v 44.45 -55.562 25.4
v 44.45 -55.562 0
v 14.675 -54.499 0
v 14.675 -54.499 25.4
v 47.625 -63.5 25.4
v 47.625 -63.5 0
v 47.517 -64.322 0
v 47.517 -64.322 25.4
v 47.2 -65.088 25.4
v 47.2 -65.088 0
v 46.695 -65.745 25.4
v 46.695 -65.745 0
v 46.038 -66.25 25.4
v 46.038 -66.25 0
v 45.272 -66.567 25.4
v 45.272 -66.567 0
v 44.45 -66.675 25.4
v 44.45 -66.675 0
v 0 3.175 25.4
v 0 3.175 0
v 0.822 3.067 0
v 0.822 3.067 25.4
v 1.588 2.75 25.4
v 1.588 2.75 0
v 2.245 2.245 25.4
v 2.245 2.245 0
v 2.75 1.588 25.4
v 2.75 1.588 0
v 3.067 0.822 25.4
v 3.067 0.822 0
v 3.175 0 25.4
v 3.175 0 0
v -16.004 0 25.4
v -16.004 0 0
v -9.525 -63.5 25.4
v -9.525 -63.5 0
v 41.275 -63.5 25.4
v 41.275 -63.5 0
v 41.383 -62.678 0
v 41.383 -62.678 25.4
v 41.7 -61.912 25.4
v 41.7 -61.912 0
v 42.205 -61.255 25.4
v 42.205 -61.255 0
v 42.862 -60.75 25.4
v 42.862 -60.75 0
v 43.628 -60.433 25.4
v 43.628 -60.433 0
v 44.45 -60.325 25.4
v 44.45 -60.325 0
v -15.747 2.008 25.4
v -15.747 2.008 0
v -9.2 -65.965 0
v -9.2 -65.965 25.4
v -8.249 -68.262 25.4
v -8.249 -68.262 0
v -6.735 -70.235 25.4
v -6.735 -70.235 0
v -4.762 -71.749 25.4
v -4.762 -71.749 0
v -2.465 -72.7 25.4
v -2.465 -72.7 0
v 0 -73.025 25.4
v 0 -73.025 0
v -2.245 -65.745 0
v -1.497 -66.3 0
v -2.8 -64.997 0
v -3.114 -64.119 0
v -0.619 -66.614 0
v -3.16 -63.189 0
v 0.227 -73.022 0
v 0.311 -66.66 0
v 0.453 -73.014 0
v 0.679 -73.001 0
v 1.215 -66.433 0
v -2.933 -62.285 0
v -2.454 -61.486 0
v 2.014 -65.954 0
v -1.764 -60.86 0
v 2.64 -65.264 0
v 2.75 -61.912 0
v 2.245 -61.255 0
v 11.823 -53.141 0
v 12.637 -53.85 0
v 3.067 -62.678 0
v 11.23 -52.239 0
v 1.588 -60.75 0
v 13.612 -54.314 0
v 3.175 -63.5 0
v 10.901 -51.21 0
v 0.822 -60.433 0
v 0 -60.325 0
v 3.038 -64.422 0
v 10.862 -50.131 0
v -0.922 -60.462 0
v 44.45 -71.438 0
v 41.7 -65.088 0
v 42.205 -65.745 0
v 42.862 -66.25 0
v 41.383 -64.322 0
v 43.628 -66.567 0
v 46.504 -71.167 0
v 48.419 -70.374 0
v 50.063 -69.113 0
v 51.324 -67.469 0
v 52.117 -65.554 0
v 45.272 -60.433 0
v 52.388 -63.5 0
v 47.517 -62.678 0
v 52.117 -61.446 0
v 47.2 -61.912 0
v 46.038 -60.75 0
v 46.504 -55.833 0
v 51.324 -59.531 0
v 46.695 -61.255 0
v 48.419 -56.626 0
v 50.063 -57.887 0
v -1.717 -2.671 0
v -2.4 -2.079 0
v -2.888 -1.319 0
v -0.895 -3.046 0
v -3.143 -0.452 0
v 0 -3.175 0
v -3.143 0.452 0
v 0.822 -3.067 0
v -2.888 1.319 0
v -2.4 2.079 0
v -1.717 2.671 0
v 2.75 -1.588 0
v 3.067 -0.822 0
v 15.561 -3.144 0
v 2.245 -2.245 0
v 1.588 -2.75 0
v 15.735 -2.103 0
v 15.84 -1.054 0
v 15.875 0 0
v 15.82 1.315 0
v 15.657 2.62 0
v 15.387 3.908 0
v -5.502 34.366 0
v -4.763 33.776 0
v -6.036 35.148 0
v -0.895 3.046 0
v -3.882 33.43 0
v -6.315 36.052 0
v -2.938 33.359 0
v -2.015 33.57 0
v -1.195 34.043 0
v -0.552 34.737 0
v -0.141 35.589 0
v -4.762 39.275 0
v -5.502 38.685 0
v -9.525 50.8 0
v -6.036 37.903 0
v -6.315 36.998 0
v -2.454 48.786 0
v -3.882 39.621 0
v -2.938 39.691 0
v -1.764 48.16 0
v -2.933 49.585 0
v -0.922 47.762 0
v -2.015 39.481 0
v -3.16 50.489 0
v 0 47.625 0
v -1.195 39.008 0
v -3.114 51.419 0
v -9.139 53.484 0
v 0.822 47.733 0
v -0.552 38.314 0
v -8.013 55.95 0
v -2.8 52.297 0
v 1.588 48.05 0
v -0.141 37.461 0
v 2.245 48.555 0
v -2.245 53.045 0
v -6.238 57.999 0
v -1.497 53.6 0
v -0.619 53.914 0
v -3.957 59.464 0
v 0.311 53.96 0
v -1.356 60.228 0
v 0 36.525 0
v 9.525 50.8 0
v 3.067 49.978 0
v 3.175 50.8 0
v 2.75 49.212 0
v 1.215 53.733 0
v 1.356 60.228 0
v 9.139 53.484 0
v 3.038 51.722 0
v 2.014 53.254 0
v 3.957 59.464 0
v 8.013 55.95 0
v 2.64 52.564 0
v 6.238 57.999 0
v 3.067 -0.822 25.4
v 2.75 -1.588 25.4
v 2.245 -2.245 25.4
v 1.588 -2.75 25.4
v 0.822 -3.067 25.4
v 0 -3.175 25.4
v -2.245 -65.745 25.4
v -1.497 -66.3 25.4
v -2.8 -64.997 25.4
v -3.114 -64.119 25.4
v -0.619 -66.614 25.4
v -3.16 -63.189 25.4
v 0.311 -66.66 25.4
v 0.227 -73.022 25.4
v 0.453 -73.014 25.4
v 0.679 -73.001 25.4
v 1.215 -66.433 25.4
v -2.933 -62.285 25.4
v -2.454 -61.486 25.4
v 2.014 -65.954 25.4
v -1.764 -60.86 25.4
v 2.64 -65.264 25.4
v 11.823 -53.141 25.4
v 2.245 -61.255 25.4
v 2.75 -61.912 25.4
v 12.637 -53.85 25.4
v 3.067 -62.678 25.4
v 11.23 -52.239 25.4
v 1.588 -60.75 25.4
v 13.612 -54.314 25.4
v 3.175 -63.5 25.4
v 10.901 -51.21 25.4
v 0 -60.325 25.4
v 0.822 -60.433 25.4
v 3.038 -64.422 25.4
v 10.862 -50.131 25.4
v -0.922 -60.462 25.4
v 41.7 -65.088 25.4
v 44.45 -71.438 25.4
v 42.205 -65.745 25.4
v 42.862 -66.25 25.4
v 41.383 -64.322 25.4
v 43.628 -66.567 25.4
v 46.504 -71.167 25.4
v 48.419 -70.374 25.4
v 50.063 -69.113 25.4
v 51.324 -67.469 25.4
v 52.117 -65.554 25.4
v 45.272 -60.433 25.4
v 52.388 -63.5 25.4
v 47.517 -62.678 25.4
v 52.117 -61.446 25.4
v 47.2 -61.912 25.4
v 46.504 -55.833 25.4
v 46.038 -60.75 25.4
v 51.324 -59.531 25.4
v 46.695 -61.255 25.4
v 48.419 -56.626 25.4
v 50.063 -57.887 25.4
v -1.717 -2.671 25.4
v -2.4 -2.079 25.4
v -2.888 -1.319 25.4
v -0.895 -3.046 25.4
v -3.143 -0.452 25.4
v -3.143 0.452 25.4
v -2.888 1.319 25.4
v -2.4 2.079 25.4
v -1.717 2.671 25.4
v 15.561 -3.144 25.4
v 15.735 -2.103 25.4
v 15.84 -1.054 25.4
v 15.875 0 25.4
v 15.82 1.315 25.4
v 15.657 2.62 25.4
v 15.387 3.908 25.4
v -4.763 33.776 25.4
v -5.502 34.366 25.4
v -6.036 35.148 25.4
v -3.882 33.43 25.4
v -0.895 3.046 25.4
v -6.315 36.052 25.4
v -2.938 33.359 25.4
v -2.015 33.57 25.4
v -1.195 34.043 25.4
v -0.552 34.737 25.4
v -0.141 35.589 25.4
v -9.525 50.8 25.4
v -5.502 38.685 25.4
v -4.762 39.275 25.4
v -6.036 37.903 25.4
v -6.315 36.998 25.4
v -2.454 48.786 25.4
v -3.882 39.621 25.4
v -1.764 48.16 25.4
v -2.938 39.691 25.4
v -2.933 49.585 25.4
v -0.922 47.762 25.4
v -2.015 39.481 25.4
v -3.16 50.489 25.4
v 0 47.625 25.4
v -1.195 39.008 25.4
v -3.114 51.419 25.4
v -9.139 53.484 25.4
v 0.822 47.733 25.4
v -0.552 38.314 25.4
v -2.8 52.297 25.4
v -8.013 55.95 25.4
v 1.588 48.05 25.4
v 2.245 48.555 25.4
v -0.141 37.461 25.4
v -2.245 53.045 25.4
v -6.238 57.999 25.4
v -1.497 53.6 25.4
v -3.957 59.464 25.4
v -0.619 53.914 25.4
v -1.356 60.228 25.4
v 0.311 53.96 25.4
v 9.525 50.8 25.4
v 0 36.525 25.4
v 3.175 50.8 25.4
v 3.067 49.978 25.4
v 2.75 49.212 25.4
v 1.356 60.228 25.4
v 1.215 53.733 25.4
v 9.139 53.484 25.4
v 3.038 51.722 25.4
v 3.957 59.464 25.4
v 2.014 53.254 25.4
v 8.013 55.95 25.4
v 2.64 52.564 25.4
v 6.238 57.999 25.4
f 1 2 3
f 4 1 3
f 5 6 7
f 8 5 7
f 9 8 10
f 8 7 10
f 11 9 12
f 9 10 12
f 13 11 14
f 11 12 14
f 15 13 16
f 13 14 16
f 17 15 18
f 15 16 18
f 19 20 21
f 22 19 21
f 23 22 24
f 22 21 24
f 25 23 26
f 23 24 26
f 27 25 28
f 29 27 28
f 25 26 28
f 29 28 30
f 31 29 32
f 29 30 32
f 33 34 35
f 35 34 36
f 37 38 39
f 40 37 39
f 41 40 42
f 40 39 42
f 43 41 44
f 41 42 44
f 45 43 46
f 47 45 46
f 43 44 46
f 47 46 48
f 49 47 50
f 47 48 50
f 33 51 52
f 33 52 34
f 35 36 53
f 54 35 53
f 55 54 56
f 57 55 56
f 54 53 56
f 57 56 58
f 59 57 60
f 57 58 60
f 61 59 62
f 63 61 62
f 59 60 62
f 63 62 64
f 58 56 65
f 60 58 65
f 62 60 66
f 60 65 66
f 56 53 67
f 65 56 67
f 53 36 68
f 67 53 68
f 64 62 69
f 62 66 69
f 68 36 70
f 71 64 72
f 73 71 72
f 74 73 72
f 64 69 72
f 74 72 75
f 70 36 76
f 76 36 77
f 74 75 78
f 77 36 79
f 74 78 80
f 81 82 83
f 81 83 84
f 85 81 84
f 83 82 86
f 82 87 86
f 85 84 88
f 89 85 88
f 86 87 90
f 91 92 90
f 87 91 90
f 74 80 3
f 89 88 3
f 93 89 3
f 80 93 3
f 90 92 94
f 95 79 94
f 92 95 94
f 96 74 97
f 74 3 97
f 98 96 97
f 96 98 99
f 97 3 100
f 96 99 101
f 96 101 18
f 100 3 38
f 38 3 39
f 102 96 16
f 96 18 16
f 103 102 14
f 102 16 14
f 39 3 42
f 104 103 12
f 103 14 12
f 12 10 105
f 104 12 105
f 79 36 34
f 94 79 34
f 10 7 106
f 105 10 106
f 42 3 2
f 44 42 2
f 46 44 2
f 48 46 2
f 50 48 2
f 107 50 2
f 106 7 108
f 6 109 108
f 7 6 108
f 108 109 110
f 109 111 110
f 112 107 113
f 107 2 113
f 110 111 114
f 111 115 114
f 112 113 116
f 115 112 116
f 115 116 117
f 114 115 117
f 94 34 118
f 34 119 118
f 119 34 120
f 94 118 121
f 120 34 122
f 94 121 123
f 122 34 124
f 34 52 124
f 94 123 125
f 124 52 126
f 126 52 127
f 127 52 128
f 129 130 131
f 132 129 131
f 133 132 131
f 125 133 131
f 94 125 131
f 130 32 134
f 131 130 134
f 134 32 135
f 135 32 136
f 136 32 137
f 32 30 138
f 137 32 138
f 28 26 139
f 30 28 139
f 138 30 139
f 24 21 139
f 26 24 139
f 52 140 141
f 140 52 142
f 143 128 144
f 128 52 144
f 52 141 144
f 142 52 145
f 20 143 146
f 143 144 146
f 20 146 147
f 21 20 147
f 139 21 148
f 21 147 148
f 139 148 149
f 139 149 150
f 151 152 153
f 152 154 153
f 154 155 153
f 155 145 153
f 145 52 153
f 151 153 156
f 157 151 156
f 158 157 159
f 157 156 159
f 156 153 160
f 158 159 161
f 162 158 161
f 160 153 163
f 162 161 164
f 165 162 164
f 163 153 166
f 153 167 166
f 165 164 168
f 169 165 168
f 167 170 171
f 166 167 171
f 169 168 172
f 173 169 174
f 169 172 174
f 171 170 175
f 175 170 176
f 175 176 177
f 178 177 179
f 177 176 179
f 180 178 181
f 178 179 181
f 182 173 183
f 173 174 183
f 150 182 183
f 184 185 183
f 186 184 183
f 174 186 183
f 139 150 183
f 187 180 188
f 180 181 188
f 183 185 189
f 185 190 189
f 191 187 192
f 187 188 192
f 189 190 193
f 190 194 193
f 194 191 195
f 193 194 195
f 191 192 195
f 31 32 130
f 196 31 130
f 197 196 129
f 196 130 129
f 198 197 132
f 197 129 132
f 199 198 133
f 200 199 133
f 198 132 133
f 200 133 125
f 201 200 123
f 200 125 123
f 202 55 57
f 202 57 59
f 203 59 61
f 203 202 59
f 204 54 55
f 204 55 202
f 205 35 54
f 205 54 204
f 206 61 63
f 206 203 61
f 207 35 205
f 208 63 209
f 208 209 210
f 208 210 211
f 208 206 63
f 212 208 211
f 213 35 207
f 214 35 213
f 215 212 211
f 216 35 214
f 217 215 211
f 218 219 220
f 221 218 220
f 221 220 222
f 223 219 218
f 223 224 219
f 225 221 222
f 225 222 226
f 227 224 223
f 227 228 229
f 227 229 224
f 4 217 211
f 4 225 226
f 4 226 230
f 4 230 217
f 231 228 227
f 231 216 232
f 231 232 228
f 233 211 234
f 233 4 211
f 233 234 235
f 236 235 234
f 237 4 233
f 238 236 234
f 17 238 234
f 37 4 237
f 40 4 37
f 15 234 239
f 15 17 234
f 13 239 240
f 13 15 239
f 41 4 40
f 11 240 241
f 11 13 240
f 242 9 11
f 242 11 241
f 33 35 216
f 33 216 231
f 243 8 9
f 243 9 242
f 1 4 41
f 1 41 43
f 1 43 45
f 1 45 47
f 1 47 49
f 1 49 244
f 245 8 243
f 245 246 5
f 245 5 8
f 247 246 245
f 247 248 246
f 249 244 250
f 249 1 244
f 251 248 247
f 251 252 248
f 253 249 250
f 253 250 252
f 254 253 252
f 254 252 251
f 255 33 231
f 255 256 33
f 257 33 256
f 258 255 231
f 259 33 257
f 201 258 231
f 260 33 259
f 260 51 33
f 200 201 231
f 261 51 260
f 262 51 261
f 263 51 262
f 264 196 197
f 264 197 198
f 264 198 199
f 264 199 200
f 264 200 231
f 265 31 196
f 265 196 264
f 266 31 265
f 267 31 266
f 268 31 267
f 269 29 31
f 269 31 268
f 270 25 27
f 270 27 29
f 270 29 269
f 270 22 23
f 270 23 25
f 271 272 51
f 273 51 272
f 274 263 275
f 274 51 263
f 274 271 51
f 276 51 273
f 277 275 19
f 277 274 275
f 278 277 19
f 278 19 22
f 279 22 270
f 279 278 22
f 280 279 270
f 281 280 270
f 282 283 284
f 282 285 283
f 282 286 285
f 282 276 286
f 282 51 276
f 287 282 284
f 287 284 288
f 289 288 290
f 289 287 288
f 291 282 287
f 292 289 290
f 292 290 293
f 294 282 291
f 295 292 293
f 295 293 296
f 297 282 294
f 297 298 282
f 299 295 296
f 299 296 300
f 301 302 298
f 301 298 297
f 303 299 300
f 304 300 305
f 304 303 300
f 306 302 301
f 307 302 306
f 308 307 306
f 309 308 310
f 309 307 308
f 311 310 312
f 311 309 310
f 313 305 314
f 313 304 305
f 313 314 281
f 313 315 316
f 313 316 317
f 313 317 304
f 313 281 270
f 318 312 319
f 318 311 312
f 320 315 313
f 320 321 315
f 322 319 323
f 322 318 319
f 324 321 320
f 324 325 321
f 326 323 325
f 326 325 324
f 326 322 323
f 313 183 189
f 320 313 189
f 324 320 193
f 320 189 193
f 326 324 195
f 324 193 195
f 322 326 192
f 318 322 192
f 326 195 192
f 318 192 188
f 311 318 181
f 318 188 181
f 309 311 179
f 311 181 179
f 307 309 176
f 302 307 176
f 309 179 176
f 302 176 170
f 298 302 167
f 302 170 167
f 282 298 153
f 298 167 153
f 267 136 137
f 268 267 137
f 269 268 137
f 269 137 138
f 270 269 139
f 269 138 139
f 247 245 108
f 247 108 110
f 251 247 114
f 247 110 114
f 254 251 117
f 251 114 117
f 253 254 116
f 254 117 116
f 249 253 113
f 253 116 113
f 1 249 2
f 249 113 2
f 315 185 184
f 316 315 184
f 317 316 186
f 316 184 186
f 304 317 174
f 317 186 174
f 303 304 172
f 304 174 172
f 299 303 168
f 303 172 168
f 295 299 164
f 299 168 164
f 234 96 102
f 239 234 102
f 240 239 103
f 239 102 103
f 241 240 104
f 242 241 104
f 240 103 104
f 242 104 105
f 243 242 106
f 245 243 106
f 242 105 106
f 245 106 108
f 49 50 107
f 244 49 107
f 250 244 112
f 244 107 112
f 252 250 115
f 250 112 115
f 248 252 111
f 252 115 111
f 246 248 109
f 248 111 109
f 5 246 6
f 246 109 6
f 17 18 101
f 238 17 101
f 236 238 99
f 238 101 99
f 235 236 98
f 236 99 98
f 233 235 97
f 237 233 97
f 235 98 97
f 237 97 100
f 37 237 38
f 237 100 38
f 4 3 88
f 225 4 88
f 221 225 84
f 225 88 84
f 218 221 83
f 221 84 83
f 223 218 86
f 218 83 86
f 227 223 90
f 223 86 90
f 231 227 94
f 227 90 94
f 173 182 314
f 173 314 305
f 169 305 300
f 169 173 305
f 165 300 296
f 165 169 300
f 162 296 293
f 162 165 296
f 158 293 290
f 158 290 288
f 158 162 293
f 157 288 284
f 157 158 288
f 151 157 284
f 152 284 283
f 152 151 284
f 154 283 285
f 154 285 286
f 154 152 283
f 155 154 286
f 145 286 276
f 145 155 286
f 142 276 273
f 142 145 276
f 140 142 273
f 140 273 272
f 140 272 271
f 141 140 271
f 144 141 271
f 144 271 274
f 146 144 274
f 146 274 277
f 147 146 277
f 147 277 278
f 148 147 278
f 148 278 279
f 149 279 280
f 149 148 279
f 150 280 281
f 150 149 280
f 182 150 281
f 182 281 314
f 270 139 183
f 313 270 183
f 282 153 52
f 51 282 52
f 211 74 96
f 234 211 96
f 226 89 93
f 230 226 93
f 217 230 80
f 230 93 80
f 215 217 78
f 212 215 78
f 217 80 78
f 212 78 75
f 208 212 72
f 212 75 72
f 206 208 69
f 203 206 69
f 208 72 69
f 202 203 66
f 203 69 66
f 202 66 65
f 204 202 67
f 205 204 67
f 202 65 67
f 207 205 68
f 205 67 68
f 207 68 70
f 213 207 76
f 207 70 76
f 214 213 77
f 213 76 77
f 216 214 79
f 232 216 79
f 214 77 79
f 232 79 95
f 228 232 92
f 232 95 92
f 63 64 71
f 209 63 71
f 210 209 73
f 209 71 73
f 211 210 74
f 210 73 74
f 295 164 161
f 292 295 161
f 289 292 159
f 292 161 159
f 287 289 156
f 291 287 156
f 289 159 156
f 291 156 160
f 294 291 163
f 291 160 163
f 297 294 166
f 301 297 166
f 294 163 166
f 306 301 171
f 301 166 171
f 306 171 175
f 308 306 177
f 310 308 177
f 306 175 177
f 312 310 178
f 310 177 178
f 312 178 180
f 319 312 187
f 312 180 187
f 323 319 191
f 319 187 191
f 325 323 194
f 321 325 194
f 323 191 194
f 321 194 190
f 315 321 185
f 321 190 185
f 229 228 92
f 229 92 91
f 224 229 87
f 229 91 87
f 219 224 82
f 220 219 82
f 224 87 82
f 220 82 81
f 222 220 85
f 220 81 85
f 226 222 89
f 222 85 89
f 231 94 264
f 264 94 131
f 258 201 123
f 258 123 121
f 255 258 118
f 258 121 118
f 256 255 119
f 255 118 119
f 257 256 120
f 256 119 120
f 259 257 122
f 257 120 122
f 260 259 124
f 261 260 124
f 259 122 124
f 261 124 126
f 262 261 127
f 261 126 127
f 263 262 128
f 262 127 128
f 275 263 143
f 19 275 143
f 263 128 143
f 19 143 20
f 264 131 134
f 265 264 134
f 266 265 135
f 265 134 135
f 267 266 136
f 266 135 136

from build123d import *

# Parameters (mm, degrees)
F0_R     = 3.175
F1_DEPTH = 25.4


with BuildPart() as f1:
    # F0 (on Top) → F1 (new body)
    with BuildSketch(Plane.XY):
        with BuildLine():
            ThreePointArc((-9.525, 50.8), (-6.7351920908, 44.0648079092), (0, 41.275))
            ThreePointArc((0, 41.275), (6.7351920908, 44.0648079092), (9.525, 50.8))
            ThreePointArc((9.525, 50.8), (0, 60.325), (-9.525, 50.8))
        make_face()
        with BuildLine():
            ThreePointArc((3.175, 50.8), (2.2450640303, 48.5549359697), (0, 47.625))
            ThreePointArc((0, 47.625), (-2.2450640303, 53.0450640303), (3.175, 50.8))
        make_face(mode=Mode.SUBTRACT)
        with BuildLine():
            ThreePointArc((9.525, 50.8), (6.7351920908, 44.0648079092), (0, 41.275))
            Line((0, 41.275), (0, 36.5252))
            Line((0, 36.5252), (0, 15.875))
            ThreePointArc((0, 15.875), (9.7463072395, 12.5309664508), (15.3865384615, 3.9076923077))
            Line((15.3865384615, 3.9076923077), (9.525, 50.8))
        make_face()
        with BuildLine():
            Line((0, 36.5252), (0, 41.275))
            ThreePointArc((0, 41.275), (-6.7351920908, 44.0648079092), (-9.525, 50.8))
            Line((-9.525, 50.8), (-15.7474568951, 2.0082894055))
            ThreePointArc((-15.7474568951, 2.0082894055), (-10.4912828264, 11.9142188018), (0, 15.875))
            Line((0, 15.875), (0, 36.5252))
        make_face()
        with Locations((-3.175, 36.5252)):
            Circle(F0_R, mode=Mode.SUBTRACT)
        with BuildLine():
            ThreePointArc((15.3865384615, 3.9076923077), (9.7463072395, 12.5309664508), (0, 15.875))
            Line((0, 15.875), (0, 3.175))
            ThreePointArc((0, 3.175), (2.2450640303, 2.2450640303), (3.175, 0))
            ThreePointArc((3.175, 0), (2.2450640303, -2.2450640303), (0, -3.175))
            Line((0, -3.175), (0, -15.875))
            ThreePointArc((0, -15.875), (10.0526499203, -12.2865721249), (15.5606435644, -3.1435643564))
            Line((15.5606435644, -3.1435643564), (15.875, 0))
            Line((15.875, 0), (15.3865384615, 3.9076923077))
        make_face()
        with BuildLine():
            Line((0, 3.175), (0, 15.875))
            ThreePointArc((0, 15.875), (-10.4912828264, 11.9142188018), (-15.7474568951, 2.0082894055))
            ThreePointArc((-15.7474568951, 2.0082894055), (-11.9142188018, -10.4912828264), (0, -15.875))
            Line((0, -15.875), (0, -3.175))
            ThreePointArc((0, -3.175), (-3.175, 0), (0, 3.175))
        make_face()
        with BuildLine():
            ThreePointArc((0, -15.875), (-11.9142188018, -10.4912828264), (-15.7474568951, 2.0082894055))
            Line((-15.7474568951, 2.0082894055), (-16.0035761028, 0))
            Line((-16.0035761028, 0), (-9.525, -63.5))
            ThreePointArc((-9.525, -63.5), (-6.7351920908, -56.7648079092), (0, -53.975))
            Line((0, -53.975), (0, -15.875))
        make_face()
        with BuildLine():
            ThreePointArc((15.875, 0), (15.7524112928, 1.9690514116), (15.3865384615, 3.9076923077))
            Line((15.3865384615, 3.9076923077), (15.875, 0))
        make_face()
        with BuildLine():
            ThreePointArc((15.5606435644, -3.1435643564), (10.0526499203, -12.2865721249), (0, -15.875))
            Line((0, -15.875), (0, -53.975))
            Line((0, -53.975), (0.6794904459, -53.9992675159))
            ThreePointArc((0.6794904459, -53.9992675159), (6.9712901065, -57.0094885216), (9.525, -63.5))
            Line((9.525, -63.5), (36.5125, -63.5))
            ThreePointArc((36.5125, -63.5), (38.8373399243, -57.8873399243), (44.45, -55.5625))
            Line((44.45, -55.5625), (14.6753932646, -54.499121188))
            ThreePointArc((14.6753932646, -54.499121188), (11.8227843813, -53.1408361956), (10.8618983328, -50.1310166722))
            Line((10.8618983328, -50.1310166722), (15.5606435644, -3.1435643564))
        make_face()
        with BuildLine():
            ThreePointArc((15.5606435644, -3.1435643564), (15.7962153946, -1.5796215395), (15.875, 0))
            Line((15.875, 0), (15.5606435644, -3.1435643564))
        make_face()
        with BuildLine():
            Line((0, -60.325), (0, -53.975))
            ThreePointArc((0, -53.975), (-6.7351920908, -56.7648079092), (-9.525, -63.5))
            ThreePointArc((-9.525, -63.5), (-6.7351920908, -70.2351920908), (0, -73.025))
            Line((0, -73.025), (0.6794904459, -73.0007324841))
            ThreePointArc((0.6794904459, -73.0007324841), (6.9712901065, -69.9905114784), (9.525, -63.5))
            Line((9.525, -63.5), (3.175, -63.5))
            ThreePointArc((3.175, -63.5), (-2.2450640303, -65.7450640303), (0, -60.325))
        make_face()
        with BuildLine():
            Line((0.6794904459, -73.0007324841), (0, -73.025))
            ThreePointArc((0, -73.025), (0.3399618281, -73.0189311877), (0.6794904459, -73.0007324841))
        make_face()
        with BuildLine():
            Line((36.5125, -63.5), (9.525, -63.5))
            ThreePointArc((9.525, -63.5), (6.9712901065, -69.9905114784), (0.6794904459, -73.0007324841))
            Line((0.6794904459, -73.0007324841), (44.45, -71.4375))
            ThreePointArc((44.45, -71.4375), (38.8373399243, -69.1126600757), (36.5125, -63.5))
        make_face()
        with BuildLine():
            ThreePointArc((44.45, -55.5625), (38.8373399243, -57.8873399243), (36.5125, -63.5))
            Line((36.5125, -63.5), (41.275, -63.5))
            ThreePointArc((41.275, -63.5), (42.2049359697, -61.2549359697), (44.45, -60.325))
            Line((44.45, -60.325), (44.45, -55.5625))
        make_face()
        with BuildLine():
            Line((41.275, -63.5), (36.5125, -63.5))
            ThreePointArc((36.5125, -63.5), (38.8373399243, -69.1126600757), (44.45, -71.4375))
            Line((44.45, -71.4375), (44.45, -66.675))
            ThreePointArc((44.45, -66.675), (42.2049359697, -65.7450640303), (41.275, -63.5))
        make_face()
        with BuildLine():
            ThreePointArc((52.3875, -63.5), (50.0626600757, -57.8873399243), (44.45, -55.5625))
            Line((44.45, -55.5625), (44.45, -60.325))
            ThreePointArc((44.45, -60.325), (46.6950640303, -61.2549359697), (47.625, -63.5))
            ThreePointArc((47.625, -63.5), (46.6950640303, -65.7450640303), (44.45, -66.675))
            Line((44.45, -66.675), (44.45, -71.4375))
            ThreePointArc((44.45, -71.4375), (50.0626600757, -69.1126600757), (52.3875, -63.5))
        make_face()
        with BuildLine():
            Line((0.6794904459, -53.9992675159), (0, -53.975))
            Line((0, -53.975), (0, -60.325))
            ThreePointArc((0, -60.325), (2.2450640303, -61.2549359697), (3.175, -63.5))
            Line((3.175, -63.5), (9.525, -63.5))
            ThreePointArc((9.525, -63.5), (6.9712901065, -57.0094885216), (0.6794904459, -53.9992675159))
        make_face()
    extrude(amount=F1_DEPTH)


solid = f1.part
